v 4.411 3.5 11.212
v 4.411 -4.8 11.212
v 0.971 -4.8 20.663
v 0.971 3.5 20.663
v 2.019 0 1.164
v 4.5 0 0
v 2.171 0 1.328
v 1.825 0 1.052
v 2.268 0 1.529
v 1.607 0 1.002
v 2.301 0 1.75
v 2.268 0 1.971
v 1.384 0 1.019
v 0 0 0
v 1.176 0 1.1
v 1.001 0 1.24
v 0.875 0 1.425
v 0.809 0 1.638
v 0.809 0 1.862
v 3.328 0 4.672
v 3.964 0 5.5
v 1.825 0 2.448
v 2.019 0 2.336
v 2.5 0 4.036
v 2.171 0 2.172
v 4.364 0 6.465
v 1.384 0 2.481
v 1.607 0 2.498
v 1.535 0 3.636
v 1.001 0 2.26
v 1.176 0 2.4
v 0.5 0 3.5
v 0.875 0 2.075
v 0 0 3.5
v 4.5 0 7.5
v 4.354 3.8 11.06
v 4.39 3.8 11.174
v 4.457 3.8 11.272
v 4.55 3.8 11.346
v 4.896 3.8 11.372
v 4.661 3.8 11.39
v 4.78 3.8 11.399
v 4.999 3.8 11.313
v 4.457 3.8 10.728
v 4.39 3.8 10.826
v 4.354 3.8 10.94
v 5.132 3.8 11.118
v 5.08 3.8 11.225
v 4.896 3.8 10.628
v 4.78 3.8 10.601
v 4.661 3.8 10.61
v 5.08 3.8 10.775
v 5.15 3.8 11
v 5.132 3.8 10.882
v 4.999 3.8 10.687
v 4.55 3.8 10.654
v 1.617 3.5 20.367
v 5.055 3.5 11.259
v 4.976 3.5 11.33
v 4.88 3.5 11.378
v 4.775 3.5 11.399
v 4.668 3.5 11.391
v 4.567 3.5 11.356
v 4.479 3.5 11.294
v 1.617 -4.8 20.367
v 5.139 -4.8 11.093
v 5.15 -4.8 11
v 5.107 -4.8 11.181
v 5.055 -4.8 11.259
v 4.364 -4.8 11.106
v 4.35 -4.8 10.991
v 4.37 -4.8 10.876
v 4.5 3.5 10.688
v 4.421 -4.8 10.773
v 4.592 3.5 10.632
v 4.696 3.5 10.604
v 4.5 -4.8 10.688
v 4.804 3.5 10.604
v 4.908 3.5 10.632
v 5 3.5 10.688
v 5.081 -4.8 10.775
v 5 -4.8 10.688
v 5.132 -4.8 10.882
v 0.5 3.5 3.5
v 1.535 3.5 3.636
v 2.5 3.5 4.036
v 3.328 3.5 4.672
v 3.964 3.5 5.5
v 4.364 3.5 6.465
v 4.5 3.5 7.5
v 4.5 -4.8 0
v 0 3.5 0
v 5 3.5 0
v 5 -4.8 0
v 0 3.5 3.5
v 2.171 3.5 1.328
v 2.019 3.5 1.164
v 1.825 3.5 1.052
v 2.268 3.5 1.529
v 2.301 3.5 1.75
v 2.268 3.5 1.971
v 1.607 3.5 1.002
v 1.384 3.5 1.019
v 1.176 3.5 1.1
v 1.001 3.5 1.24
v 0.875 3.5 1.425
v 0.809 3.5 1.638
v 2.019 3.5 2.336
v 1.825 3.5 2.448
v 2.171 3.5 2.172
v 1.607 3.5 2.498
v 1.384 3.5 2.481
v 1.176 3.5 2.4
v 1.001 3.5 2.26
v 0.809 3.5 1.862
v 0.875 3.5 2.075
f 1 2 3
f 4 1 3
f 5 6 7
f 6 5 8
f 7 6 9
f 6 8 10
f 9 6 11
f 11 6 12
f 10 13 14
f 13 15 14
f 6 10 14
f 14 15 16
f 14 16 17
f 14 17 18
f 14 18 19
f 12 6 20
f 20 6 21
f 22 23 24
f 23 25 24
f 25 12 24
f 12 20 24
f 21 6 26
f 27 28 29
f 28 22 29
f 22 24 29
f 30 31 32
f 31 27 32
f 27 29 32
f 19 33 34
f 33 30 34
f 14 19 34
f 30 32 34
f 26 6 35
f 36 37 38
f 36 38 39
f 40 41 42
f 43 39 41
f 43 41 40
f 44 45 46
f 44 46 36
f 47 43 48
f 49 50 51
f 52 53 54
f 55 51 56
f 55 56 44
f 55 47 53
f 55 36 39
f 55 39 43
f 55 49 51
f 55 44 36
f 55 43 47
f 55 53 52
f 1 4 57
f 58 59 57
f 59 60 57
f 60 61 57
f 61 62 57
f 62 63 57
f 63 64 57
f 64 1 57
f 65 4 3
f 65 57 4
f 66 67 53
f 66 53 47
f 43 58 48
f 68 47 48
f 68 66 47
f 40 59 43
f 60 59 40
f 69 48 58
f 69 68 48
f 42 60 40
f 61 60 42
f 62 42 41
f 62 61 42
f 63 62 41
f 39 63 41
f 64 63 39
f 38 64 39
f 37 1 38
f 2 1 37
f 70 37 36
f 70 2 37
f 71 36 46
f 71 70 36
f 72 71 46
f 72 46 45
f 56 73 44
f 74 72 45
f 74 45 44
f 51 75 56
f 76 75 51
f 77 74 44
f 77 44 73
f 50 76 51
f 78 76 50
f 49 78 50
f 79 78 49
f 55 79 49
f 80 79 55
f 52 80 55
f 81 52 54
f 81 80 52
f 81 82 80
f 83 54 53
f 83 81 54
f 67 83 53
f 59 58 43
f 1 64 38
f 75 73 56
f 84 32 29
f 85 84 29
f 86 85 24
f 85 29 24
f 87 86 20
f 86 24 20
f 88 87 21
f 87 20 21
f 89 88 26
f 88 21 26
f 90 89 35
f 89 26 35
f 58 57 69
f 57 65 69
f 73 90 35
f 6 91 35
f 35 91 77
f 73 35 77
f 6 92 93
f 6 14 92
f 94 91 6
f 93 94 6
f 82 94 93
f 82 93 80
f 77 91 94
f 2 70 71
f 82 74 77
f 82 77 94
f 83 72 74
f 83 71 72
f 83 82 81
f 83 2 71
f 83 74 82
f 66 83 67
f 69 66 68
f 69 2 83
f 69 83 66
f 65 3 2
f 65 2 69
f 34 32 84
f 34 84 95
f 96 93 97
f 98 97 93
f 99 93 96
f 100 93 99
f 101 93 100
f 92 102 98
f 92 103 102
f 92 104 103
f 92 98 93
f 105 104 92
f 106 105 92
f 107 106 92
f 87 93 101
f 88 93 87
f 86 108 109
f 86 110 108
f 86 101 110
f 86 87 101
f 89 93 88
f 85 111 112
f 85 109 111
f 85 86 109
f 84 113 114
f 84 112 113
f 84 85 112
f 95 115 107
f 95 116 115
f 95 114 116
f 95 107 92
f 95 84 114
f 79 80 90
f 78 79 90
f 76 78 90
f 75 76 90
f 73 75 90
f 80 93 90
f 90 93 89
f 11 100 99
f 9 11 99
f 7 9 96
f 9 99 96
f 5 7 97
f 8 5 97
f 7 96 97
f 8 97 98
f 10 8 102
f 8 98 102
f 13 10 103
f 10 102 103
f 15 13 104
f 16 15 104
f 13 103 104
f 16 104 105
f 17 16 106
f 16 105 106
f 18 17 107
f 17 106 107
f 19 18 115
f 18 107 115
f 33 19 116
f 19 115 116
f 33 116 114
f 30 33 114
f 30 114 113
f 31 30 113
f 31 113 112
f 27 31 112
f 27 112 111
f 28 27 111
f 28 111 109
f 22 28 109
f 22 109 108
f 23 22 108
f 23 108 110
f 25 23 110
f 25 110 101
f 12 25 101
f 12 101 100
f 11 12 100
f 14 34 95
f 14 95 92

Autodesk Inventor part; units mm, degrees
ref_plane "YZ Plane" through (0, 0, 0) normal (1, 0, 0) x (0, 1, 0)
ref_plane "XZ Plane" through (0, 0, 0) normal (0, 1, 0) x (-1, 0, 0)
ref_plane "XY Plane" through (0, 0, 0) normal (0, 0, 1) x (1, 0, 0)
sketch "Sketch1" plane through (0, 0, 0) normal (0, 1, 0) x (-1, 0, 0)
  line L0 (0, 0) -> (-5, 0)
  line L1 (-5, 0) -> (-5, 3.5)
  line L2 (-0.5, 3.5) -> (0, 3.5)
  line L3 (0, 3.5) -> (0, 0)
  line L4 (-5, 0) -> (-4.5, 0)
  line L5 (-4.5, 7.5) -> (-4.5, 11)
  line L6 (-4.5, 11) -> (-5, 11)
  line L7 (-5, 11) -> (-5, 0)
  arc A0 (-4.5, 7.5) -> (-0.5, 3.5) centre (-0.5, 7.5) ccw
  dimension "d0" = 5
  dimension "d1" = 3.5
  dimension "d2" = 0.5
  dimension "d3" = 11
  dimension "d4" = 4
extrude "Extrusion1" add sketch "Sketch1" along normal blind 3.5
sketch "Sketch2" plane through (0, 3.5, 0) normal (0, 1, 0) x (1, 0, 0)
  line L0 (0, -3.5) -> (0.5, -3.5) projected
  line L1 (5, -11) -> (5, 0) projected
  line L2 (0, -3.5) -> (5, -3.5)
  line L3 (5, -3.5) -> (5, 0)
  line L4 (5, 0) -> (0, 0)
  line L5 (0, 0) -> (0, -3.5)
  circle A0 centre (1.551, -1.75) radius 0.75
  dimension "d7" = 1.5
extrude "Extrusion2" cut sketch "Sketch2" against normal blind 3.5 contours A0
sketch "Sketch3" plane through (0, 0, 0) normal (0, -1, 0) x (1, 0, 0)
  line L0 (5, 11) -> (5, 0) projected
  arc A0 (0.5, 3.5) -> (4.5, 7.5) centre (0.5, 7.5) ccw projected
  line L1 (5, 11) -> (4.5, 11)
  line L2 (4.5, 11) -> (4.5, 7.5)
  line L3 (4.5, 7.5) -> (5, 7.5)
  line L4 (5, 7.5) -> (5, 11)
  line L5 (5, 0) -> (0, 0) projected
  line L6 (5, 7.5) -> (4.5, 7.5)
  line L7 (4.5, 7.5) -> (4.5, 0)
  line L8 (4.5, 0) -> (5, 0)
  line L9 (5, 0) -> (5, 7.5)
extrude "Extrusion3" add sketch "Sketch3" along normal blind 4.8
sketch "Sketch4" plane through (0, 3.5, 0) normal (0, 1, 0) x (1, 0, 0)
  line L0 (5, -11) -> (4.5, -11) projected
  circle A0 centre (4.75, -11) radius 0.4
  point P0 (0, 0)
  dimension "d12" = 0.8
extrude "Extrusion4" add sketch "Sketch4" along normal blind 0.3 and the other way blind 8.3
sketch "Sketch5" plane through (0, -4.8, 0) normal (0, -1, 0) x (1, 0, 0)
  circle A0 centre (4.75, 11) radius 0.4 projected
  line L0 (4.6264, 10.6196) -> (0.9709, 20.663)
  line L1 (4.6264, 10.6196) -> (15.3144, 10.6196) construction
  line L2 (0.9709, 20.663) -> (1.4407, 20.834)
  line L3 (1.4407, 20.834) -> (5.0551, 11.2587)
  point P0 (0, 0)
  point P1 (4.4108, 11.212)
  dimension "d17" = 10.688
  dimension "d18" = 110
  dimension "d19" = 0.5
extrude "Extrusion5" add sketch "Sketch5" against normal blind 8.3 contours A0 L0 L2 L3
chamfer "Chamfer1" distance 0.5 angle 45 1 edges at (1.4407, -0.65, 20.834)
sketch "Sketch6" plane through (5, -4.8, 0) normal (1, 0, 0) x (0, 0, -1)
  point P0 (0, 4.8)
properties part number "McCrea_finger_Walle"
